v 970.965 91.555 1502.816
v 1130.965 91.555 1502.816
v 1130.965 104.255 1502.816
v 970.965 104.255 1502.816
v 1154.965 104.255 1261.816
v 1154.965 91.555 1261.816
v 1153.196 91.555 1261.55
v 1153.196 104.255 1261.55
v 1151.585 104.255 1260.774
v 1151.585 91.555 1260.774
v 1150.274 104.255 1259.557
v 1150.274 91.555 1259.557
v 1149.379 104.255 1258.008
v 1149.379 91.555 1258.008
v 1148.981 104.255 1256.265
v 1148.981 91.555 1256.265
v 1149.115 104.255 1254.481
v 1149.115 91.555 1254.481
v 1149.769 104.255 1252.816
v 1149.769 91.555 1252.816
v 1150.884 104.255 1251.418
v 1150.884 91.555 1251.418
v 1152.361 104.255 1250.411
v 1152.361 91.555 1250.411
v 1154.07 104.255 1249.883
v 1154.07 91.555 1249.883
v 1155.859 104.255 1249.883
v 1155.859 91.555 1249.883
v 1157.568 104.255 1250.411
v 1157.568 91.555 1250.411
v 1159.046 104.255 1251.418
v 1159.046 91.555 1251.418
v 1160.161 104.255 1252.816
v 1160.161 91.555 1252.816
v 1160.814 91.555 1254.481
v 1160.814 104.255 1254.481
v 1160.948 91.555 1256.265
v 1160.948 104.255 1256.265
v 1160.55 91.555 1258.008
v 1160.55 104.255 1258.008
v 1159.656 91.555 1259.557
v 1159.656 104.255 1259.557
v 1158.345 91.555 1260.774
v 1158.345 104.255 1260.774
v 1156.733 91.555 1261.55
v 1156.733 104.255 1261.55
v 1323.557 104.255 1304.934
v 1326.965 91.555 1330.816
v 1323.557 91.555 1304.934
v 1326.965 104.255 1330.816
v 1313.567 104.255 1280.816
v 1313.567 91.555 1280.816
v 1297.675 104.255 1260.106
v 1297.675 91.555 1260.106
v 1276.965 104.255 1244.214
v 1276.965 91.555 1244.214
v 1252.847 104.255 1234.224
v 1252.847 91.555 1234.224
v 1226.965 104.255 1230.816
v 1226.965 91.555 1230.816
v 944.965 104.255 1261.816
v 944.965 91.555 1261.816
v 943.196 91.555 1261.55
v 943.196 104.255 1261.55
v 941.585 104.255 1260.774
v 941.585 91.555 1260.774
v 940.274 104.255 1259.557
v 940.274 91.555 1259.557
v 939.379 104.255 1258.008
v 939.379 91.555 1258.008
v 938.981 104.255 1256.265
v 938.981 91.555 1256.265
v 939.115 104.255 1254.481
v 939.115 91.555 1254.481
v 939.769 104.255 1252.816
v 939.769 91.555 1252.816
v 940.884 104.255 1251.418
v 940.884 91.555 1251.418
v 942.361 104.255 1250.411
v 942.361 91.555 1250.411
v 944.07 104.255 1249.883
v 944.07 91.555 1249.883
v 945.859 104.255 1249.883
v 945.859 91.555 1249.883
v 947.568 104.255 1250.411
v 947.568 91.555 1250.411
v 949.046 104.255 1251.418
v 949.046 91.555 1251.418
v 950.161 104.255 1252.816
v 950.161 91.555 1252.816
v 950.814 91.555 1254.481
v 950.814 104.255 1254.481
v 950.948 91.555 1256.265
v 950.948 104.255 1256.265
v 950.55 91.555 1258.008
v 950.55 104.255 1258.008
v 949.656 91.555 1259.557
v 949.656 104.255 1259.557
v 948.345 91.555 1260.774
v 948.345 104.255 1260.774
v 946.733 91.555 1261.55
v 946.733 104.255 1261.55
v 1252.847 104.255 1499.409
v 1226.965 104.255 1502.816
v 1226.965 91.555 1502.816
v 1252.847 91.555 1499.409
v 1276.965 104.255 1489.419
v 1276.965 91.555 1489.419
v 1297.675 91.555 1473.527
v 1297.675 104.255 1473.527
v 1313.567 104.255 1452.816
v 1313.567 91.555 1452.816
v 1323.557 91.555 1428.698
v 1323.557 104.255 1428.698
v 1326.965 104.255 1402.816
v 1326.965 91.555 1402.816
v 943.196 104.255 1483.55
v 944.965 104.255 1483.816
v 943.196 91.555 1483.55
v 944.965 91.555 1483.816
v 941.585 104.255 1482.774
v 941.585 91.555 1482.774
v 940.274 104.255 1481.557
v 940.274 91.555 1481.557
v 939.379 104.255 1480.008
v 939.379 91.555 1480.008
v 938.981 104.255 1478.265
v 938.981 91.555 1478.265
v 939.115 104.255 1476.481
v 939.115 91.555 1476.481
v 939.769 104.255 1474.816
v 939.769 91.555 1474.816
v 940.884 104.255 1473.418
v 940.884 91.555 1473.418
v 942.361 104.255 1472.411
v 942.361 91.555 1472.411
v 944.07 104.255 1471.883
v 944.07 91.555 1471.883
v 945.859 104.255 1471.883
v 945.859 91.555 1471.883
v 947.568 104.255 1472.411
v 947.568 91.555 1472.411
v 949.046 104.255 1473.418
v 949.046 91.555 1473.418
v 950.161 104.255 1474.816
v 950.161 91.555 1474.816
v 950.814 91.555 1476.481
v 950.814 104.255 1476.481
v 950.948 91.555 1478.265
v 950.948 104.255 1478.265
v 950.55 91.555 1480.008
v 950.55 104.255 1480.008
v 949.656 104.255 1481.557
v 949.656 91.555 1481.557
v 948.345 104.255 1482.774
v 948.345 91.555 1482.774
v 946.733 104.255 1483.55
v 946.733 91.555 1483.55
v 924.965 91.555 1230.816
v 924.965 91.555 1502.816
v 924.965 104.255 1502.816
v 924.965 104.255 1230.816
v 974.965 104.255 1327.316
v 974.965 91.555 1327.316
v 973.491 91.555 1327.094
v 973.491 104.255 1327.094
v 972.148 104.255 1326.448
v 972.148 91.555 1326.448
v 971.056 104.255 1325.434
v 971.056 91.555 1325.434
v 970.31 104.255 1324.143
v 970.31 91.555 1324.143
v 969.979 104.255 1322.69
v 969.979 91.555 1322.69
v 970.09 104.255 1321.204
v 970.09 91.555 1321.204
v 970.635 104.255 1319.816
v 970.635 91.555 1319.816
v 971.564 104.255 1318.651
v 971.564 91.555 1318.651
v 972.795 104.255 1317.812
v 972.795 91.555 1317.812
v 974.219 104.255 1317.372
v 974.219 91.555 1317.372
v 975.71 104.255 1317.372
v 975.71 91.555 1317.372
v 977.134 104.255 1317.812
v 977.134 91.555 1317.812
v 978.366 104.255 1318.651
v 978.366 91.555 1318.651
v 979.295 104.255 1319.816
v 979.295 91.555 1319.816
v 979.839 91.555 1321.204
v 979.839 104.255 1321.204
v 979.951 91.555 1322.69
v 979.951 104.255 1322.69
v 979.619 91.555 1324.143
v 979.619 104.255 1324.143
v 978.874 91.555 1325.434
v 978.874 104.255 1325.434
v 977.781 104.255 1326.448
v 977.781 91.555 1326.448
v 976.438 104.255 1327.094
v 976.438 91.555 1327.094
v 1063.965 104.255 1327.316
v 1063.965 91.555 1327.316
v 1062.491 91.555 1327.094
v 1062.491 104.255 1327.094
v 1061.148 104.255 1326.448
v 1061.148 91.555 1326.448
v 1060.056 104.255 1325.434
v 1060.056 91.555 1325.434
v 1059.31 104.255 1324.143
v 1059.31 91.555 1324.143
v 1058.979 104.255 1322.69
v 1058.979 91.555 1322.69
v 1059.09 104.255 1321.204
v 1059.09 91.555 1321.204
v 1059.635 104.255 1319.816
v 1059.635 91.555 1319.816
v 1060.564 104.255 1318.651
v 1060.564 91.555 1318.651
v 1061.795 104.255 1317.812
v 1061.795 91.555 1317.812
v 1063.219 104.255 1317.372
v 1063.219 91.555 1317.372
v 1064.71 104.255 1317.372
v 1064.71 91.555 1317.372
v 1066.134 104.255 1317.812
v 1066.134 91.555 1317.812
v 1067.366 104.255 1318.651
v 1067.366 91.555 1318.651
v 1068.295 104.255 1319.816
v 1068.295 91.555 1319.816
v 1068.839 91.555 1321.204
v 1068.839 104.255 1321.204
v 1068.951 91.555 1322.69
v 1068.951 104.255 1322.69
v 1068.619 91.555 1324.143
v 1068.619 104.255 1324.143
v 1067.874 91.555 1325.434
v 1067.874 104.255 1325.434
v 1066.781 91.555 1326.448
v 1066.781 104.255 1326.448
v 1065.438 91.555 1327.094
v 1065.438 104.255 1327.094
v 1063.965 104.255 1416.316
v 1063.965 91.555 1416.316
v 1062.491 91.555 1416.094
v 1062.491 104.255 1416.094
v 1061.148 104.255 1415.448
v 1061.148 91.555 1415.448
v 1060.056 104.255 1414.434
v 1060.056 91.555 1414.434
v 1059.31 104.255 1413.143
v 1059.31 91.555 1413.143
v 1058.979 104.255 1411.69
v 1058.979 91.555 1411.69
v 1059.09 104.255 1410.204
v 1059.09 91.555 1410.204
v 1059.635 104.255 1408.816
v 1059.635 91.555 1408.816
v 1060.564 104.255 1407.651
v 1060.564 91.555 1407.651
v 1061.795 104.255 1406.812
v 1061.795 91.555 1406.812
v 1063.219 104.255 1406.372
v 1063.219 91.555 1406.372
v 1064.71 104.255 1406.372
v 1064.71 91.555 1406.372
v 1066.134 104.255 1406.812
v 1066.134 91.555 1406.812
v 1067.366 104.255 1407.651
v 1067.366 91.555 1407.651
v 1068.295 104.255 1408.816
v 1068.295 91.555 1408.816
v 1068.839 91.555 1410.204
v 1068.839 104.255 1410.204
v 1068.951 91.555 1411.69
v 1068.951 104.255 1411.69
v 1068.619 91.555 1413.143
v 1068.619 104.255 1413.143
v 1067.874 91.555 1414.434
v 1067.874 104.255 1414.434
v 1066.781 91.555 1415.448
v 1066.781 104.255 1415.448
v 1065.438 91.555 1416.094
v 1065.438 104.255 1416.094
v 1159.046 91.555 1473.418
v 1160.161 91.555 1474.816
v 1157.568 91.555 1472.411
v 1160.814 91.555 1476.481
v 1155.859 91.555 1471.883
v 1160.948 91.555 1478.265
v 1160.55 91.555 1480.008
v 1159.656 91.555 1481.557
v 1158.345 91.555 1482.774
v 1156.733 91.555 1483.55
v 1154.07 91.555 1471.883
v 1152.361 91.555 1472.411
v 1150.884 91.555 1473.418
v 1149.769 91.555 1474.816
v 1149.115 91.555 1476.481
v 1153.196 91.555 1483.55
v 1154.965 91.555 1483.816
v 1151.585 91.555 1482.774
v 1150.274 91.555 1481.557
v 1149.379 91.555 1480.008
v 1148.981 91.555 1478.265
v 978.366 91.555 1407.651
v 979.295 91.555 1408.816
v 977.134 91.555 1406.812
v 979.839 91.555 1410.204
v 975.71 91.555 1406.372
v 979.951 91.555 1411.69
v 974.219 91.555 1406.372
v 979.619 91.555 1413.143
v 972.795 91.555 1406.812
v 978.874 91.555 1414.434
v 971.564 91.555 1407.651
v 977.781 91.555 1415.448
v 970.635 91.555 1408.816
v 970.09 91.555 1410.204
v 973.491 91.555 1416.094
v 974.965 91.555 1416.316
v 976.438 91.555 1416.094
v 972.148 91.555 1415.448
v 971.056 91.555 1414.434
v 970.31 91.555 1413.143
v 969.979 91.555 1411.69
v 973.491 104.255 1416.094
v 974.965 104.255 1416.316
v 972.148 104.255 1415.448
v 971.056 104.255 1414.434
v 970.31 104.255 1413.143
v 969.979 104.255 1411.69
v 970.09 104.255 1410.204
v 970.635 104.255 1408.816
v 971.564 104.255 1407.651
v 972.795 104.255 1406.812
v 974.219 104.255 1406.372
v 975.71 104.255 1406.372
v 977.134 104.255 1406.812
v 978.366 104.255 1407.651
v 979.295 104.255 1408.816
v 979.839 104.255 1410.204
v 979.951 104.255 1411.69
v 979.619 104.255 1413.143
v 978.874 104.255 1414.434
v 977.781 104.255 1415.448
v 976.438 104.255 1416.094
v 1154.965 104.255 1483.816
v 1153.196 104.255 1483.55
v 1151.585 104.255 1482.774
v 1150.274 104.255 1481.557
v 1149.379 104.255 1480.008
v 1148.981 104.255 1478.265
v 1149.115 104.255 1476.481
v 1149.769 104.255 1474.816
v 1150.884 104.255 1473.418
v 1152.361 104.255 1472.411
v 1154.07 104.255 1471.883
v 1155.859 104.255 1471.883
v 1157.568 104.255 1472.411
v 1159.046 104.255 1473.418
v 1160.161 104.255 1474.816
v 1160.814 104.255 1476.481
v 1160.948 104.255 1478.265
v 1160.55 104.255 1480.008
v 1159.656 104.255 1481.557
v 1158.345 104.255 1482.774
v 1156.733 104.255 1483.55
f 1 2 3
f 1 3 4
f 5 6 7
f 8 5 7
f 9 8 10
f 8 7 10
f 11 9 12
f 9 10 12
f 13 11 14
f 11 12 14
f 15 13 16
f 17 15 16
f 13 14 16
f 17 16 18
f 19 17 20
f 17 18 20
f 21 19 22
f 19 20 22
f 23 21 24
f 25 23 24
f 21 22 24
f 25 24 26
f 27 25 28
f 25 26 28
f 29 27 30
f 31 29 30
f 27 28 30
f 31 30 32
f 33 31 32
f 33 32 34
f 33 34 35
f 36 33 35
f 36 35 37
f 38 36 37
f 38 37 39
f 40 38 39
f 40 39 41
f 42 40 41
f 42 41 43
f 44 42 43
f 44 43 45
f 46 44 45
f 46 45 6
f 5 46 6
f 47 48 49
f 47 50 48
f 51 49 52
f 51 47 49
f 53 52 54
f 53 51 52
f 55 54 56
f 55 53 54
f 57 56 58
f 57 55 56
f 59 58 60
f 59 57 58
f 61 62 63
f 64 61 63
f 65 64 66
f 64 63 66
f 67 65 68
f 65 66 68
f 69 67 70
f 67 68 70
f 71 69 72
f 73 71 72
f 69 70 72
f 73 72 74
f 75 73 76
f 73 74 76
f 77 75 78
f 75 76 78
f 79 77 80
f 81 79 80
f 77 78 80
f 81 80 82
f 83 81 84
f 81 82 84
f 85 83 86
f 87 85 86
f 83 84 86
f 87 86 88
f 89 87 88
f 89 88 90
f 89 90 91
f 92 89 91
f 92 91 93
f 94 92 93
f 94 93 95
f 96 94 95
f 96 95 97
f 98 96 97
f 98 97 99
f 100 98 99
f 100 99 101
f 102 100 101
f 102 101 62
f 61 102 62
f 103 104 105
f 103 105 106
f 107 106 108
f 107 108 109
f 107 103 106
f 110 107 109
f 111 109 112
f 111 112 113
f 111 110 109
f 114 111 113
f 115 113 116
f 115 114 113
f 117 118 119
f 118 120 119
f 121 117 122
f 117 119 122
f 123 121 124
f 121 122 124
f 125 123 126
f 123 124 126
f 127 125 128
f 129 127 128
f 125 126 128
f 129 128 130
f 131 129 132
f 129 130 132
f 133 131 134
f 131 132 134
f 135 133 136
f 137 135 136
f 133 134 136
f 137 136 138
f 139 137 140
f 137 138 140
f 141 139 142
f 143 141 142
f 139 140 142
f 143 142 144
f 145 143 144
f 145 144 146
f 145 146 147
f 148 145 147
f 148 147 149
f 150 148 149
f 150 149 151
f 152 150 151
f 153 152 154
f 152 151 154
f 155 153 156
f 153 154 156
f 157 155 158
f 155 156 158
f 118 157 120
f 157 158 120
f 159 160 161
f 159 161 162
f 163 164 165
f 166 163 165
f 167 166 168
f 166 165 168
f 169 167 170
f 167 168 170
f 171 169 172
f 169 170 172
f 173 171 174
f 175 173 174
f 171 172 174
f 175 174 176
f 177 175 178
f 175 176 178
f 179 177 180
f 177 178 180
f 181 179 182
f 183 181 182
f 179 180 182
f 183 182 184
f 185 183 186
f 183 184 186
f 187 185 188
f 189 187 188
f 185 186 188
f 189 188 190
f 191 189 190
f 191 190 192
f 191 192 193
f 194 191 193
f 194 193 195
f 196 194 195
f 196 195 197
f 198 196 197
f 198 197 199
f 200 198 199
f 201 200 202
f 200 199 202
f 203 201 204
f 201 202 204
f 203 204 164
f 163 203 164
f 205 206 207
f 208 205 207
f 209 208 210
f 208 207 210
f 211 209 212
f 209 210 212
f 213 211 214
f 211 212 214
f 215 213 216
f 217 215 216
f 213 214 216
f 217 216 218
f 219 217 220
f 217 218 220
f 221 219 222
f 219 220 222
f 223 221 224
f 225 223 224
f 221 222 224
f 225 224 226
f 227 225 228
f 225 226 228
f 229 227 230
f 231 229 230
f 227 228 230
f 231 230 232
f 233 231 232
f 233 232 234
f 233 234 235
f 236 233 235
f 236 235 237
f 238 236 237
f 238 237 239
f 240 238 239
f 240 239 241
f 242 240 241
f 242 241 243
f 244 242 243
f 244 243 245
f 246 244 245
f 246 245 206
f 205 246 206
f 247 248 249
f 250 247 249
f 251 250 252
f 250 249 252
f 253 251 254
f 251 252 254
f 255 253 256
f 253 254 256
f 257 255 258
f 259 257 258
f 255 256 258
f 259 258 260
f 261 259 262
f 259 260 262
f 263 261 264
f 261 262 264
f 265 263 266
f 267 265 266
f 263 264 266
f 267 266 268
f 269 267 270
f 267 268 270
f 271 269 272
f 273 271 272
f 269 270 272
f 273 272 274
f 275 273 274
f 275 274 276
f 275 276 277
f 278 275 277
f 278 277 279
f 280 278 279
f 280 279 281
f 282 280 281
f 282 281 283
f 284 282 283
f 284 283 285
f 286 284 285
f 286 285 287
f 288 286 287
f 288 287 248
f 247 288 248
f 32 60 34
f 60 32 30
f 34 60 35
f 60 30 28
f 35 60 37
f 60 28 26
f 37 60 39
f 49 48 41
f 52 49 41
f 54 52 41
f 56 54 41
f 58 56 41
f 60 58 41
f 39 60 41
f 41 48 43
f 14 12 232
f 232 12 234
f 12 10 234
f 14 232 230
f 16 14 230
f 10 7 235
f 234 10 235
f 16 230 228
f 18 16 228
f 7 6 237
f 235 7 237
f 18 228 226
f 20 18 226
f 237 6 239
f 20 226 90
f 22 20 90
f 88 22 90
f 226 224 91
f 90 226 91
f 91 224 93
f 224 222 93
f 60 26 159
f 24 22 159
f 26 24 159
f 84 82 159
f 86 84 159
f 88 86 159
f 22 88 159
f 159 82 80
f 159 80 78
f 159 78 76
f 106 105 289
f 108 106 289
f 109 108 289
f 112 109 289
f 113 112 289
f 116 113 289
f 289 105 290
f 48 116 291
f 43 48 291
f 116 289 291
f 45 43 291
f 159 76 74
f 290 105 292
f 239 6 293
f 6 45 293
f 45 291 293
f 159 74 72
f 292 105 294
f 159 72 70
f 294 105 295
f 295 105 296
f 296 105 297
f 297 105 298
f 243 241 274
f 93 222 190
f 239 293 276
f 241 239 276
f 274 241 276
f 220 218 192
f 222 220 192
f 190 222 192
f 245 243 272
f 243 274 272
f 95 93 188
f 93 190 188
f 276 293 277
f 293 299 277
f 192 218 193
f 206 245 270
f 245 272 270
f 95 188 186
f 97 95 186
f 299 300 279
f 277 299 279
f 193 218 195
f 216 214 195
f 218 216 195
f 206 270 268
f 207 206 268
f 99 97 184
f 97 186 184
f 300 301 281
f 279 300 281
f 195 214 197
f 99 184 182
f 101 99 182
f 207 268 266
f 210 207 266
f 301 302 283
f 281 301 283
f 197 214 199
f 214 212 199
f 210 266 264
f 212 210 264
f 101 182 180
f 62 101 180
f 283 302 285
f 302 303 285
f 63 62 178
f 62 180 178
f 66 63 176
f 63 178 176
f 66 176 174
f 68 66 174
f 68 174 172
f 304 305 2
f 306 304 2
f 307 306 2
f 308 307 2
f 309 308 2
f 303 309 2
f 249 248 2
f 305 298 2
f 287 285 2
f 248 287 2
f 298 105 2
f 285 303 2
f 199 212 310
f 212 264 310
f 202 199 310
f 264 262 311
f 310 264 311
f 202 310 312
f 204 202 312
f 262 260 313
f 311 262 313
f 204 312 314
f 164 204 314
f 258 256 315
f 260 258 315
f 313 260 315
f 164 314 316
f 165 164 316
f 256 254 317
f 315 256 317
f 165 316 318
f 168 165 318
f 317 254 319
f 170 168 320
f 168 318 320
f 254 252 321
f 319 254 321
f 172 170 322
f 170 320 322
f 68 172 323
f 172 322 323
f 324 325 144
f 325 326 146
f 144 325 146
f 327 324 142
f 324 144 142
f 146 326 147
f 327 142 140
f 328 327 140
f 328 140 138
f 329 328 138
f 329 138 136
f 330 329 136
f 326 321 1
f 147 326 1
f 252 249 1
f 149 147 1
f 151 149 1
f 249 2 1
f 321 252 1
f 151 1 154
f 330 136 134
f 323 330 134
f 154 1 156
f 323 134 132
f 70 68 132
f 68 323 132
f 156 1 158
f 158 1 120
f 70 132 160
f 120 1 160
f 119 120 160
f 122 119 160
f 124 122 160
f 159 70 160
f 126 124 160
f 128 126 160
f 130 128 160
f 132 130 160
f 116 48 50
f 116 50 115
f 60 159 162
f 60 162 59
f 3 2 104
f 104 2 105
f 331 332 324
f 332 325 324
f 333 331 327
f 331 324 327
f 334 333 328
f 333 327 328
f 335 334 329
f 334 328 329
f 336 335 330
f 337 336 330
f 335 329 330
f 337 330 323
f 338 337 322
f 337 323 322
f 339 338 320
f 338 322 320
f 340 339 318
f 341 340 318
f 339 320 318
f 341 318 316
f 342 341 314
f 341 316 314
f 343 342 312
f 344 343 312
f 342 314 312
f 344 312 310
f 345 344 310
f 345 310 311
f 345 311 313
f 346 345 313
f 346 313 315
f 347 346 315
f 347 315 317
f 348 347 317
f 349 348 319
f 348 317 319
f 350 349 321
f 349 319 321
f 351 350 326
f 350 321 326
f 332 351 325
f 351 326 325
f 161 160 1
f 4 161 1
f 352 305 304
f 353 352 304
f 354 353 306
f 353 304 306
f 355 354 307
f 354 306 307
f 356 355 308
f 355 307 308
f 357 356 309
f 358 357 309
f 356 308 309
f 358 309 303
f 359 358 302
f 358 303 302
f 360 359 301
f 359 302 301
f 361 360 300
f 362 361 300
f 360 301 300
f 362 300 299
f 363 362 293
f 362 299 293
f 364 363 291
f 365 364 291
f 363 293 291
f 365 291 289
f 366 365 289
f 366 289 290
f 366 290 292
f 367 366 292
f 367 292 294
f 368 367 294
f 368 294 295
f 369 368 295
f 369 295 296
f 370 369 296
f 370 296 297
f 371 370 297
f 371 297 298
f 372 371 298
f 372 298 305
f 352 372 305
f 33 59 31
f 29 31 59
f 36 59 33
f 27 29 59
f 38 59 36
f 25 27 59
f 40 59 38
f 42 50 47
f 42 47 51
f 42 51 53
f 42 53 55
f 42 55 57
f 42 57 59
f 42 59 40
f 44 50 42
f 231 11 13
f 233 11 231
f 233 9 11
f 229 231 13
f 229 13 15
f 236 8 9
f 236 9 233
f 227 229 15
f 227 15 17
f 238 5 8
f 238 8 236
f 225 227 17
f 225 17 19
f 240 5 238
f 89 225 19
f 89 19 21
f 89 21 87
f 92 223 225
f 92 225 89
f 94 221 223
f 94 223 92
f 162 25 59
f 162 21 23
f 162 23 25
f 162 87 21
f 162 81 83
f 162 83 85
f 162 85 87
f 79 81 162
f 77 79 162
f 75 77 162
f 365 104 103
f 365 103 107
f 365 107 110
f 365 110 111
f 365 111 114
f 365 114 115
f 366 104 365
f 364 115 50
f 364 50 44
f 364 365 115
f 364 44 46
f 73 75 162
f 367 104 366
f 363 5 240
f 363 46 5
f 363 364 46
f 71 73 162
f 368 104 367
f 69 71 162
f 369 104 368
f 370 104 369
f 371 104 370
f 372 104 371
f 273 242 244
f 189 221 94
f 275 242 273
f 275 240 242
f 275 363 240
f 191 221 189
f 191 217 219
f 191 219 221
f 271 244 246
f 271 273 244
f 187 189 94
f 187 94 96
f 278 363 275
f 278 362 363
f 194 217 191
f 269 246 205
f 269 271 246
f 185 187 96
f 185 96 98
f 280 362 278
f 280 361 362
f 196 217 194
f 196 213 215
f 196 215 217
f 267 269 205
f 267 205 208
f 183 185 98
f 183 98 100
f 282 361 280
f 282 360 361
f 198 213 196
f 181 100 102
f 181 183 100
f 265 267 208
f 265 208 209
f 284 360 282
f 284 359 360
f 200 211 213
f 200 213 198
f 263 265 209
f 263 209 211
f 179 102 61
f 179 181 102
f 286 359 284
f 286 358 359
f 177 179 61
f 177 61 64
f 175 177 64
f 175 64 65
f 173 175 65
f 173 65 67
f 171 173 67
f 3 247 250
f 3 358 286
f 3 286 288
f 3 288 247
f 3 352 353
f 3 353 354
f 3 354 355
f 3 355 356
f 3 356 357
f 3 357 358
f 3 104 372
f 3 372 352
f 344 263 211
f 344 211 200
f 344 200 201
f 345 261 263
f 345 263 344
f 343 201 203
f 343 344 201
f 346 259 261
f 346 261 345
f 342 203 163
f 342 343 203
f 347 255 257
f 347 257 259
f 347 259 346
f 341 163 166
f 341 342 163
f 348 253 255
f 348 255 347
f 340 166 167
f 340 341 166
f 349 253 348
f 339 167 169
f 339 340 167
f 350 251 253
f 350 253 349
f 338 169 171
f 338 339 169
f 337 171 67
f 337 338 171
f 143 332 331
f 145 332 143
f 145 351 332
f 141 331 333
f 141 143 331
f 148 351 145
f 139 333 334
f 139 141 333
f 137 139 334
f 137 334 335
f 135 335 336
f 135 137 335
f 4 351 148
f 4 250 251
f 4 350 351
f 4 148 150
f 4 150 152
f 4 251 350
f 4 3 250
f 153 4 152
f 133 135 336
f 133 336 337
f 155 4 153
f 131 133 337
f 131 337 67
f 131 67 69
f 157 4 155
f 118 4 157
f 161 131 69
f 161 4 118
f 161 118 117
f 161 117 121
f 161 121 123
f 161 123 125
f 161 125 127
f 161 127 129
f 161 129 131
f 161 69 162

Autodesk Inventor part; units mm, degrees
ref_plane "YZ Plane" through (0, 0, 0) normal (1, 0, 0) x (0, 1, 0)
ref_plane "XZ Plane" through (0, 0, 0) normal (0, 1, 0) x (-1, 0, 0)
ref_plane "Work Plane1" through (1104.5696, 91.5553, 211.8164) normal (0, 1, 0) x (-1, 0, 0)
sketch "Sketch1" plane through (1104.5696, 91.5553, 211.8164) normal (0, 1, 0) x (-1, 0, 0)
  arc A0 (57.6551, 1254.9955) -> (57.6551, 1150.0245) centre (104.395, 1202.51) ccw
  line L0 (-26.3951, 1291) -> (133.6049, 1291)
  line L1 (133.6049, 1019) -> (-26.3951, 1019)
  line L2 (-26.3951, 1249) -> (-26.3951, 1291)
  line L3 (179.6049, 2285) -> (179.6049, 25)
  line L4 (179.6049, 1019) -> (179.6049, 1291.0001)
  line L5 (-72.3951, 25) -> (-72.3951, 2285)
  line L6 (179.6049, 1291.0001) -> (-222.3951, 1291.0001)
  line L7 (179.6049, 1019) -> (-222.3951, 1019)
  line L8 (-222.3951, 25) -> (-222.3951, 2285)
  line L9 (-222.3951, 1291.0001) -> (-222.3951, 1019)
  point P0 (1104.5696, -211.8164)
  point P1 (-72.3951, 1291.0001)
  point P2 (-72.3951, 1019)
  point P3 (154, 1291)
  point P4 (4, 1291)
extrude "Extrusion1" add sketch "Sketch1" along normal blind 12.7
sketch "Sketch2" plane through (1104.5696, 104.2553, 211.8164) normal (0, 1, 0) x (1, 0, 0)
  line L0 (222.3951, -1019) -> (-179.6049, -1019) construction
  line L1 (-179.6049, -1019) -> (-179.6049, -1291.0001) construction
  line L2 (-179.6049, -1291.0001) -> (222.3951, -1291.0001) construction
  line L3 (222.3951, -1291.0001) -> (222.3951, -1019) construction
  line L4 (-179.6049, -1291.0001) -> (222.3951, -1291.0001) construction
  line L5 (21.3951, -1291.0001) -> (21.3951, -1019) construction
  line L6 (-179.6049, -1019) -> (-179.6049, -1291.0001) construction
  line L7 (-179.6049, -1155) -> (222.3951, -1155) construction
  point P0 (-1104.5696, 211.8164)
  point P1 (-159.6049, -1266.0001)
  point P2 (50.3951, -1266.0001)
  point P3 (-159.6049, -1044)
  point P4 (50.3951, -1044)
  dimension "d16" = 25
  dimension "d17" = 20
  dimension "d18" = 25
  dimension "d19" = 210
hole "Hole1" at (944.9647, 104.2553, 1477.8164) at (944.9647, 104.2553, 1255.8164) at (1154.9647, 104.2553, 1255.8164) at (1154.9647, 104.2553, 1477.8164) direction (0, -1, 0) diameter 12 end through all
fillet "Fillet1" radius 100 1 edges at (1326.9647, 97.9053, 1502.8164)
fillet "Fillet2" radius 100 1 edges at (1326.9647, 97.9053, 1230.8164)
sketch "Sketch3" plane through (1104.5696, 104.2553, 211.8164) normal (0, 1, 0) x (1, 0, 0)
  line L0 (-129.6049, -1110.5) -> (-40.6049, -1110.5)
  line L1 (-40.6049, -1110.5) -> (-40.6049, -1199.5)
  line L2 (-40.6049, -1199.5) -> (-129.6049, -1199.5)
  line L3 (-129.6049, -1199.5) -> (-129.6049, -1110.5)
  line L4 (-179.6049, -1019) -> (-179.6049, -1291.0001) projected
  line L5 (-179.6049, -1155) -> (-143.519, -1155)
  point P0 (-1104.5696, 211.8164)
  dimension "d20" = 89
  dimension "d21" = 89
  dimension "d22" = 50
hole "Hole2" at (974.9647, 104.2553, 1322.3164) at (1063.9647, 104.2553, 1322.3164) at (1063.9647, 104.2553, 1411.3164) at (974.9647, 104.2553, 1411.3164) direction (0, -1, 0) diameter 10 end through all
properties part number "PlacaInferior" material "Steel ASTM A36"
